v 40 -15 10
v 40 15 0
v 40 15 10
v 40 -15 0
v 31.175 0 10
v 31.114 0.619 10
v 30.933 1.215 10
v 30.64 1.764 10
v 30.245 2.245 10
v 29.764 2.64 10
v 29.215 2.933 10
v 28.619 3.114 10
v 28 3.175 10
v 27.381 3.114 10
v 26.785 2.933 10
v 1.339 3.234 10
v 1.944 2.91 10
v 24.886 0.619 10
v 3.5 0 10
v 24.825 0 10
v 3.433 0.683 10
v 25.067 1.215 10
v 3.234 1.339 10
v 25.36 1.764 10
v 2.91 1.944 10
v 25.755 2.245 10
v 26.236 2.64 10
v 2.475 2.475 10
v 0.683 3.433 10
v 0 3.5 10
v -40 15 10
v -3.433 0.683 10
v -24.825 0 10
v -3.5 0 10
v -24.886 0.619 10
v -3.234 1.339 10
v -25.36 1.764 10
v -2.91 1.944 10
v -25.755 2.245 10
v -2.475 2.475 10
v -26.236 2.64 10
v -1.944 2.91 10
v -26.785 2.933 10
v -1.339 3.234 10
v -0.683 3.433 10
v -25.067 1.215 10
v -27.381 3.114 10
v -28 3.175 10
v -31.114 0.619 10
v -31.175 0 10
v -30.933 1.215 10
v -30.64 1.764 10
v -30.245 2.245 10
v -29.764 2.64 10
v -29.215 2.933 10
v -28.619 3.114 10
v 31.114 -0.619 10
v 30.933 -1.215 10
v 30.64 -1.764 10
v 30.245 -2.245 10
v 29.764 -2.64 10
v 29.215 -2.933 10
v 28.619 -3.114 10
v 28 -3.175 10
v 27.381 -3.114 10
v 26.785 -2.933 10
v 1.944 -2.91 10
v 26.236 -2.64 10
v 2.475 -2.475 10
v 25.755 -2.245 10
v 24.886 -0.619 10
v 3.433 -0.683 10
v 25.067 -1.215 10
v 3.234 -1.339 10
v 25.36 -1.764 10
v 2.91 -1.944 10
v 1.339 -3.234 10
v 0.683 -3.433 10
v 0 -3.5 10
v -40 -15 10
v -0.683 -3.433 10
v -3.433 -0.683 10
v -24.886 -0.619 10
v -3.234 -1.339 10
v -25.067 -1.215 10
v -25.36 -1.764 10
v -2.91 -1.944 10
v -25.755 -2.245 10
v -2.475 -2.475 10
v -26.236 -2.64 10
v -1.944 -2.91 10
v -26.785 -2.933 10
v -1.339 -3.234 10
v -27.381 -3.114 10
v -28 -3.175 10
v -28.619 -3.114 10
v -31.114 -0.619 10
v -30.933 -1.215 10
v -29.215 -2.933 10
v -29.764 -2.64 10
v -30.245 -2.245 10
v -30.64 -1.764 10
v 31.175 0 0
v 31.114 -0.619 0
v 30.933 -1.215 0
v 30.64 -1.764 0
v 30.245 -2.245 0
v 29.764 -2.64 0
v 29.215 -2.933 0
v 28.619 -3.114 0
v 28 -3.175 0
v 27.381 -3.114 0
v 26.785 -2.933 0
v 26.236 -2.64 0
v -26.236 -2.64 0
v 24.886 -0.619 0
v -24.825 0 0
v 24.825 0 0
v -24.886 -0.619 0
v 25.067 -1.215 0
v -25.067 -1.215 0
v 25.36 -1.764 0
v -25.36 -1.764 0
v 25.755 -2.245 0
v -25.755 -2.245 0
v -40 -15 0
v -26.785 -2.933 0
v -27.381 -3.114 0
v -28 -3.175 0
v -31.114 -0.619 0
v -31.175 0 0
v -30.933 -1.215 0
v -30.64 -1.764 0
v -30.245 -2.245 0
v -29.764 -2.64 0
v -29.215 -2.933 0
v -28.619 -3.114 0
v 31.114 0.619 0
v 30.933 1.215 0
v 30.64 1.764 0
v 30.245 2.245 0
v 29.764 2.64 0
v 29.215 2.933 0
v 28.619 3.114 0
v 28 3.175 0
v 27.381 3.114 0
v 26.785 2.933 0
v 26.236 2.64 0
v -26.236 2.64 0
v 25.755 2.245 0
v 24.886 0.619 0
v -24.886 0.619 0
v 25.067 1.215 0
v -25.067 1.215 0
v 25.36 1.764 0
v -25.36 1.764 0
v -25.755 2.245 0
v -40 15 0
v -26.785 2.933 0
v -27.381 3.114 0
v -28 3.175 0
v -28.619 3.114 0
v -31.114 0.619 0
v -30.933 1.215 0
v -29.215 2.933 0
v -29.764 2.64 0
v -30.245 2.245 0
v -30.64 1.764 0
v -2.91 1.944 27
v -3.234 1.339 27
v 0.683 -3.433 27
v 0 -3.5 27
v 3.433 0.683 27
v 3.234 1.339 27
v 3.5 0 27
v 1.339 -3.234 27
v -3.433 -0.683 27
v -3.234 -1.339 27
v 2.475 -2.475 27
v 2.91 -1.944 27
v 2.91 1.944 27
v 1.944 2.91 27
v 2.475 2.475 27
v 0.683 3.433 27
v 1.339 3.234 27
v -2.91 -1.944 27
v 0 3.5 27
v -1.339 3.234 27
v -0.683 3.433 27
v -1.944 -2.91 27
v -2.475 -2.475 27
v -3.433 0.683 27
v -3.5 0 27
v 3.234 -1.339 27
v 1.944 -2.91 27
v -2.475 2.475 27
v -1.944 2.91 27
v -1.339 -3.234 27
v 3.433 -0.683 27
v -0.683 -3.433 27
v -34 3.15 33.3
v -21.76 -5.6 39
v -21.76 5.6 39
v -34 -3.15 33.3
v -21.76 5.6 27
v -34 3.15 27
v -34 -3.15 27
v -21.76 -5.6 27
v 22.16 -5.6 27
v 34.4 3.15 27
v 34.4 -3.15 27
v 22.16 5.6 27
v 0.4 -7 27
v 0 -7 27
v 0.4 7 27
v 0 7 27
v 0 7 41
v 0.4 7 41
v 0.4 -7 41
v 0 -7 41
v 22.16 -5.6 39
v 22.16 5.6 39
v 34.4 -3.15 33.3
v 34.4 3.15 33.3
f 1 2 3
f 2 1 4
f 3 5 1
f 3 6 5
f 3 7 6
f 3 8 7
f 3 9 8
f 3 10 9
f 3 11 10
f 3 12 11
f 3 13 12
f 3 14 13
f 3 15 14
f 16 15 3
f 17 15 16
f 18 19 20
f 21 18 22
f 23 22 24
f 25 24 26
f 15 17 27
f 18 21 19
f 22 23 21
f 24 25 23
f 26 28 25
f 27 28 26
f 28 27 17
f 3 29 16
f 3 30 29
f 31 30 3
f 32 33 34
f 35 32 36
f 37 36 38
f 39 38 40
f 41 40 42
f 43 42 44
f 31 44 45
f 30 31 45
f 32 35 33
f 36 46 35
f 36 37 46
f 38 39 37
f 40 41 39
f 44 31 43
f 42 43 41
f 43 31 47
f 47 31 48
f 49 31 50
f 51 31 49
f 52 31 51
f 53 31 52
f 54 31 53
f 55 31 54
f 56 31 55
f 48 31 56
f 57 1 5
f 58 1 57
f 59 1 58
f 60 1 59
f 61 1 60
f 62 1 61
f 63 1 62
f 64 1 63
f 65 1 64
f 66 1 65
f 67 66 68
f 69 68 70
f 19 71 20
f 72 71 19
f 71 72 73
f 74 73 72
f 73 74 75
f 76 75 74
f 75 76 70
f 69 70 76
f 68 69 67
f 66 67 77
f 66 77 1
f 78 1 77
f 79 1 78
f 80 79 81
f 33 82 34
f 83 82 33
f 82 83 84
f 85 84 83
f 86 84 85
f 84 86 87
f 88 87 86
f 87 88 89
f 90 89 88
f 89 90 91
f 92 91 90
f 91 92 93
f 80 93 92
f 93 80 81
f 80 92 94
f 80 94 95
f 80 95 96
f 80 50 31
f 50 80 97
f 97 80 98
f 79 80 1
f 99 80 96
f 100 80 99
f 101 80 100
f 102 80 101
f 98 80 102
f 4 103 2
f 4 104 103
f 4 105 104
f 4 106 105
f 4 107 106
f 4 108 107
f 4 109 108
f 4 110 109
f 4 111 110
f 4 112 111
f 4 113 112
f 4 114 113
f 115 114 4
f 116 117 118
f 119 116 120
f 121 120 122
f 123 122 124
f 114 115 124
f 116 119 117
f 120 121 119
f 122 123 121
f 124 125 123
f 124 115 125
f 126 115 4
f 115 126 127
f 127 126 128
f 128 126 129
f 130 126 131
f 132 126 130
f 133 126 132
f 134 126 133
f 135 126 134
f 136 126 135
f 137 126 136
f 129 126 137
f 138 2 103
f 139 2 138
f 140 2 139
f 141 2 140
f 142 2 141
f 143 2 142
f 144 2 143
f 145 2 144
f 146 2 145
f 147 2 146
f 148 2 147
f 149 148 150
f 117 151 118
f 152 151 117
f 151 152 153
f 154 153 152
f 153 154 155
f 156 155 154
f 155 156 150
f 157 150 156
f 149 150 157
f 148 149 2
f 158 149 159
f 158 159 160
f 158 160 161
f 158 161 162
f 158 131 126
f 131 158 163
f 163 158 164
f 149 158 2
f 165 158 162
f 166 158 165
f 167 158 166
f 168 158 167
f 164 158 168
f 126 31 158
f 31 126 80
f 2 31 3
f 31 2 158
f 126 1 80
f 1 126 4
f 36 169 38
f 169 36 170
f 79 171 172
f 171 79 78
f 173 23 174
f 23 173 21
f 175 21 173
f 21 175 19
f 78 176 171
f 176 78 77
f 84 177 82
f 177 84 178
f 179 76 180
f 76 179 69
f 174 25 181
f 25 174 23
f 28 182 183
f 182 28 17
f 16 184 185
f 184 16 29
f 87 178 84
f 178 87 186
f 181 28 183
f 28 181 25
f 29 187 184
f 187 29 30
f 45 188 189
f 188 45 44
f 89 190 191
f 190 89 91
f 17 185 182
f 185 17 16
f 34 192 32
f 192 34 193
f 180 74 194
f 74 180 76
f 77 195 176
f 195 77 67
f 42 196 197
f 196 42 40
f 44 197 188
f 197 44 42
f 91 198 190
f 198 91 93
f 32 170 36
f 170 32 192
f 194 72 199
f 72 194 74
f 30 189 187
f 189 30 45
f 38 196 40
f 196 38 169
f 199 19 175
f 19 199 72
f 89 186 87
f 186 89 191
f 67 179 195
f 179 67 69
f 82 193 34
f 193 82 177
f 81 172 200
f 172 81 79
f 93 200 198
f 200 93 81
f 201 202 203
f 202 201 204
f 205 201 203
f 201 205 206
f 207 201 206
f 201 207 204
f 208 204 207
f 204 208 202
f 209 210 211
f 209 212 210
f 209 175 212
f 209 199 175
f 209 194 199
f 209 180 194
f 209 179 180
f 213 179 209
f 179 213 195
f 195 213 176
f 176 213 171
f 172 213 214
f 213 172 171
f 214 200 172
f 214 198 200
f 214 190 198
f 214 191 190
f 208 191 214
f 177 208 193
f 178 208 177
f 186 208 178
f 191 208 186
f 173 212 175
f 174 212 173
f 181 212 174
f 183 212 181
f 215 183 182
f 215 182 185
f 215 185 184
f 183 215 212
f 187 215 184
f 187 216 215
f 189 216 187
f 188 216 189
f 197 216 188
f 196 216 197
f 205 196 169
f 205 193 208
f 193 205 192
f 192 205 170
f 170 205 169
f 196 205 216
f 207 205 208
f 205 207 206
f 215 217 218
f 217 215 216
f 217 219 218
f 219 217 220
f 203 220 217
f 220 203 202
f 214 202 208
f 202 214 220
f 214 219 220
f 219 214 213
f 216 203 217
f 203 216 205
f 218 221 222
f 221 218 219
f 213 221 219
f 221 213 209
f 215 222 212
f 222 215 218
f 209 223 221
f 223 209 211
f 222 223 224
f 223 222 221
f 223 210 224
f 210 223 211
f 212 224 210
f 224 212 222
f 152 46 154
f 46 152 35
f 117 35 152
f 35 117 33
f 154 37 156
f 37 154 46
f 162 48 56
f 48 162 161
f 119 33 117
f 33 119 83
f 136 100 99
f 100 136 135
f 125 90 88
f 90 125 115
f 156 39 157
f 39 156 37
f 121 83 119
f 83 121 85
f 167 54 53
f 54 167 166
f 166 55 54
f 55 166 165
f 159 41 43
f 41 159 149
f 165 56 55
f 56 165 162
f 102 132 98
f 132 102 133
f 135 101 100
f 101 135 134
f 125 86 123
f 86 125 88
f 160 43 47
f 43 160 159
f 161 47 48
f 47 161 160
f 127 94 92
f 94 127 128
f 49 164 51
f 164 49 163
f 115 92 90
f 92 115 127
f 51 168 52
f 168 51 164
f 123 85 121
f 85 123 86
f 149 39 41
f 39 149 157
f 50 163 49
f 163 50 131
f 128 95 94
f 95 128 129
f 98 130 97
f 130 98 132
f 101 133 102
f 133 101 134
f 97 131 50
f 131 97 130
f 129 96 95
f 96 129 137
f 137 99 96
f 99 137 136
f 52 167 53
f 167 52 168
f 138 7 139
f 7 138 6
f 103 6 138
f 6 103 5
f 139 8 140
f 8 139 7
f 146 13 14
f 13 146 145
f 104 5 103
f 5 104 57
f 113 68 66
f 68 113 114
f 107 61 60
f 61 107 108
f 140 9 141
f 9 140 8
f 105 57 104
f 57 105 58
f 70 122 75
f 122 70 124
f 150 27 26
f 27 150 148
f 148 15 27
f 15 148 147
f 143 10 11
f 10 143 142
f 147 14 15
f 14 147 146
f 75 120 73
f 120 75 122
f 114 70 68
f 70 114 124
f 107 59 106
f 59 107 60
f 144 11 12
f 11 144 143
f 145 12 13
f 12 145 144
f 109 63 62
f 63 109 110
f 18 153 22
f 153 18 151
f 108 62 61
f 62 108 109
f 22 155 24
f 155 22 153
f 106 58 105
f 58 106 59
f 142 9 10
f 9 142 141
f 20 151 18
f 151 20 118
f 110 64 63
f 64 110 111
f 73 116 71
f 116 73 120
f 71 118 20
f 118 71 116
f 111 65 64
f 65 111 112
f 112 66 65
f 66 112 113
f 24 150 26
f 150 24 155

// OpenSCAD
$fn = 32;

// ----------------------------------------------------------------------
// Boat cleat: 80 mm base, horn 34 mm up
// ----------------------------------------------------------------------

// --- parameters (mm) ---
base_l = 80;              // base length
base_w = 30;              // base width
base_t = 10;              // base thickness
horn_len = 68;            // horn length
horn_d = 14;              // horn diameter at the middle
horn_z = 34;              // horn axis height
end_drop = 8;             // how far the horn tips drop
post_d = 7;               // centre post diameter
holes_d = 6.35;           // fixing holes
hole_x = 28;              // fixing hole spacing

difference() {
  union() {
    translate([-40, -15, 0]) cube([base_l, base_w, base_t]);
    /* centre post, sunk 1 mm into the base */
    translate([0, 0, 9]) cylinder(h = 25, d = post_d);
    /* horn: a hull chain of boxes, full in the middle and lighter at the tips */
    hull() {
      translate([-34, -3.15, 27]) cube([0.4, 6.3, 6.3], center = false);
      translate([-21.76, -5.6, 27]) cube([0.4, 11.2, 12], center = false);
    }
    hull() {
      translate([-21.76, -5.6, 27]) cube([0.4, 11.2, 12], center = false);
      translate([0, -7, 27]) cube([0.4, 14, 14], center = false);
    }
    hull() {
      translate([0, -7, 27]) cube([0.4, 14, 14], center = false);
      translate([21.76, -5.6, 27]) cube([0.4, 11.2, 12], center = false);
    }
    hull() {
      translate([21.76, -5.6, 27]) cube([0.4, 11.2, 12], center = false);
      translate([34, -3.15, 27]) cube([0.4, 6.3, 6.3], center = false);
    }
  }
  translate([-28, 0, -2.5]) cylinder(h = base_t + 5, d = holes_d);
  translate([28, 0, -2.5]) cylinder(h = base_t + 5, d = holes_d);
}
